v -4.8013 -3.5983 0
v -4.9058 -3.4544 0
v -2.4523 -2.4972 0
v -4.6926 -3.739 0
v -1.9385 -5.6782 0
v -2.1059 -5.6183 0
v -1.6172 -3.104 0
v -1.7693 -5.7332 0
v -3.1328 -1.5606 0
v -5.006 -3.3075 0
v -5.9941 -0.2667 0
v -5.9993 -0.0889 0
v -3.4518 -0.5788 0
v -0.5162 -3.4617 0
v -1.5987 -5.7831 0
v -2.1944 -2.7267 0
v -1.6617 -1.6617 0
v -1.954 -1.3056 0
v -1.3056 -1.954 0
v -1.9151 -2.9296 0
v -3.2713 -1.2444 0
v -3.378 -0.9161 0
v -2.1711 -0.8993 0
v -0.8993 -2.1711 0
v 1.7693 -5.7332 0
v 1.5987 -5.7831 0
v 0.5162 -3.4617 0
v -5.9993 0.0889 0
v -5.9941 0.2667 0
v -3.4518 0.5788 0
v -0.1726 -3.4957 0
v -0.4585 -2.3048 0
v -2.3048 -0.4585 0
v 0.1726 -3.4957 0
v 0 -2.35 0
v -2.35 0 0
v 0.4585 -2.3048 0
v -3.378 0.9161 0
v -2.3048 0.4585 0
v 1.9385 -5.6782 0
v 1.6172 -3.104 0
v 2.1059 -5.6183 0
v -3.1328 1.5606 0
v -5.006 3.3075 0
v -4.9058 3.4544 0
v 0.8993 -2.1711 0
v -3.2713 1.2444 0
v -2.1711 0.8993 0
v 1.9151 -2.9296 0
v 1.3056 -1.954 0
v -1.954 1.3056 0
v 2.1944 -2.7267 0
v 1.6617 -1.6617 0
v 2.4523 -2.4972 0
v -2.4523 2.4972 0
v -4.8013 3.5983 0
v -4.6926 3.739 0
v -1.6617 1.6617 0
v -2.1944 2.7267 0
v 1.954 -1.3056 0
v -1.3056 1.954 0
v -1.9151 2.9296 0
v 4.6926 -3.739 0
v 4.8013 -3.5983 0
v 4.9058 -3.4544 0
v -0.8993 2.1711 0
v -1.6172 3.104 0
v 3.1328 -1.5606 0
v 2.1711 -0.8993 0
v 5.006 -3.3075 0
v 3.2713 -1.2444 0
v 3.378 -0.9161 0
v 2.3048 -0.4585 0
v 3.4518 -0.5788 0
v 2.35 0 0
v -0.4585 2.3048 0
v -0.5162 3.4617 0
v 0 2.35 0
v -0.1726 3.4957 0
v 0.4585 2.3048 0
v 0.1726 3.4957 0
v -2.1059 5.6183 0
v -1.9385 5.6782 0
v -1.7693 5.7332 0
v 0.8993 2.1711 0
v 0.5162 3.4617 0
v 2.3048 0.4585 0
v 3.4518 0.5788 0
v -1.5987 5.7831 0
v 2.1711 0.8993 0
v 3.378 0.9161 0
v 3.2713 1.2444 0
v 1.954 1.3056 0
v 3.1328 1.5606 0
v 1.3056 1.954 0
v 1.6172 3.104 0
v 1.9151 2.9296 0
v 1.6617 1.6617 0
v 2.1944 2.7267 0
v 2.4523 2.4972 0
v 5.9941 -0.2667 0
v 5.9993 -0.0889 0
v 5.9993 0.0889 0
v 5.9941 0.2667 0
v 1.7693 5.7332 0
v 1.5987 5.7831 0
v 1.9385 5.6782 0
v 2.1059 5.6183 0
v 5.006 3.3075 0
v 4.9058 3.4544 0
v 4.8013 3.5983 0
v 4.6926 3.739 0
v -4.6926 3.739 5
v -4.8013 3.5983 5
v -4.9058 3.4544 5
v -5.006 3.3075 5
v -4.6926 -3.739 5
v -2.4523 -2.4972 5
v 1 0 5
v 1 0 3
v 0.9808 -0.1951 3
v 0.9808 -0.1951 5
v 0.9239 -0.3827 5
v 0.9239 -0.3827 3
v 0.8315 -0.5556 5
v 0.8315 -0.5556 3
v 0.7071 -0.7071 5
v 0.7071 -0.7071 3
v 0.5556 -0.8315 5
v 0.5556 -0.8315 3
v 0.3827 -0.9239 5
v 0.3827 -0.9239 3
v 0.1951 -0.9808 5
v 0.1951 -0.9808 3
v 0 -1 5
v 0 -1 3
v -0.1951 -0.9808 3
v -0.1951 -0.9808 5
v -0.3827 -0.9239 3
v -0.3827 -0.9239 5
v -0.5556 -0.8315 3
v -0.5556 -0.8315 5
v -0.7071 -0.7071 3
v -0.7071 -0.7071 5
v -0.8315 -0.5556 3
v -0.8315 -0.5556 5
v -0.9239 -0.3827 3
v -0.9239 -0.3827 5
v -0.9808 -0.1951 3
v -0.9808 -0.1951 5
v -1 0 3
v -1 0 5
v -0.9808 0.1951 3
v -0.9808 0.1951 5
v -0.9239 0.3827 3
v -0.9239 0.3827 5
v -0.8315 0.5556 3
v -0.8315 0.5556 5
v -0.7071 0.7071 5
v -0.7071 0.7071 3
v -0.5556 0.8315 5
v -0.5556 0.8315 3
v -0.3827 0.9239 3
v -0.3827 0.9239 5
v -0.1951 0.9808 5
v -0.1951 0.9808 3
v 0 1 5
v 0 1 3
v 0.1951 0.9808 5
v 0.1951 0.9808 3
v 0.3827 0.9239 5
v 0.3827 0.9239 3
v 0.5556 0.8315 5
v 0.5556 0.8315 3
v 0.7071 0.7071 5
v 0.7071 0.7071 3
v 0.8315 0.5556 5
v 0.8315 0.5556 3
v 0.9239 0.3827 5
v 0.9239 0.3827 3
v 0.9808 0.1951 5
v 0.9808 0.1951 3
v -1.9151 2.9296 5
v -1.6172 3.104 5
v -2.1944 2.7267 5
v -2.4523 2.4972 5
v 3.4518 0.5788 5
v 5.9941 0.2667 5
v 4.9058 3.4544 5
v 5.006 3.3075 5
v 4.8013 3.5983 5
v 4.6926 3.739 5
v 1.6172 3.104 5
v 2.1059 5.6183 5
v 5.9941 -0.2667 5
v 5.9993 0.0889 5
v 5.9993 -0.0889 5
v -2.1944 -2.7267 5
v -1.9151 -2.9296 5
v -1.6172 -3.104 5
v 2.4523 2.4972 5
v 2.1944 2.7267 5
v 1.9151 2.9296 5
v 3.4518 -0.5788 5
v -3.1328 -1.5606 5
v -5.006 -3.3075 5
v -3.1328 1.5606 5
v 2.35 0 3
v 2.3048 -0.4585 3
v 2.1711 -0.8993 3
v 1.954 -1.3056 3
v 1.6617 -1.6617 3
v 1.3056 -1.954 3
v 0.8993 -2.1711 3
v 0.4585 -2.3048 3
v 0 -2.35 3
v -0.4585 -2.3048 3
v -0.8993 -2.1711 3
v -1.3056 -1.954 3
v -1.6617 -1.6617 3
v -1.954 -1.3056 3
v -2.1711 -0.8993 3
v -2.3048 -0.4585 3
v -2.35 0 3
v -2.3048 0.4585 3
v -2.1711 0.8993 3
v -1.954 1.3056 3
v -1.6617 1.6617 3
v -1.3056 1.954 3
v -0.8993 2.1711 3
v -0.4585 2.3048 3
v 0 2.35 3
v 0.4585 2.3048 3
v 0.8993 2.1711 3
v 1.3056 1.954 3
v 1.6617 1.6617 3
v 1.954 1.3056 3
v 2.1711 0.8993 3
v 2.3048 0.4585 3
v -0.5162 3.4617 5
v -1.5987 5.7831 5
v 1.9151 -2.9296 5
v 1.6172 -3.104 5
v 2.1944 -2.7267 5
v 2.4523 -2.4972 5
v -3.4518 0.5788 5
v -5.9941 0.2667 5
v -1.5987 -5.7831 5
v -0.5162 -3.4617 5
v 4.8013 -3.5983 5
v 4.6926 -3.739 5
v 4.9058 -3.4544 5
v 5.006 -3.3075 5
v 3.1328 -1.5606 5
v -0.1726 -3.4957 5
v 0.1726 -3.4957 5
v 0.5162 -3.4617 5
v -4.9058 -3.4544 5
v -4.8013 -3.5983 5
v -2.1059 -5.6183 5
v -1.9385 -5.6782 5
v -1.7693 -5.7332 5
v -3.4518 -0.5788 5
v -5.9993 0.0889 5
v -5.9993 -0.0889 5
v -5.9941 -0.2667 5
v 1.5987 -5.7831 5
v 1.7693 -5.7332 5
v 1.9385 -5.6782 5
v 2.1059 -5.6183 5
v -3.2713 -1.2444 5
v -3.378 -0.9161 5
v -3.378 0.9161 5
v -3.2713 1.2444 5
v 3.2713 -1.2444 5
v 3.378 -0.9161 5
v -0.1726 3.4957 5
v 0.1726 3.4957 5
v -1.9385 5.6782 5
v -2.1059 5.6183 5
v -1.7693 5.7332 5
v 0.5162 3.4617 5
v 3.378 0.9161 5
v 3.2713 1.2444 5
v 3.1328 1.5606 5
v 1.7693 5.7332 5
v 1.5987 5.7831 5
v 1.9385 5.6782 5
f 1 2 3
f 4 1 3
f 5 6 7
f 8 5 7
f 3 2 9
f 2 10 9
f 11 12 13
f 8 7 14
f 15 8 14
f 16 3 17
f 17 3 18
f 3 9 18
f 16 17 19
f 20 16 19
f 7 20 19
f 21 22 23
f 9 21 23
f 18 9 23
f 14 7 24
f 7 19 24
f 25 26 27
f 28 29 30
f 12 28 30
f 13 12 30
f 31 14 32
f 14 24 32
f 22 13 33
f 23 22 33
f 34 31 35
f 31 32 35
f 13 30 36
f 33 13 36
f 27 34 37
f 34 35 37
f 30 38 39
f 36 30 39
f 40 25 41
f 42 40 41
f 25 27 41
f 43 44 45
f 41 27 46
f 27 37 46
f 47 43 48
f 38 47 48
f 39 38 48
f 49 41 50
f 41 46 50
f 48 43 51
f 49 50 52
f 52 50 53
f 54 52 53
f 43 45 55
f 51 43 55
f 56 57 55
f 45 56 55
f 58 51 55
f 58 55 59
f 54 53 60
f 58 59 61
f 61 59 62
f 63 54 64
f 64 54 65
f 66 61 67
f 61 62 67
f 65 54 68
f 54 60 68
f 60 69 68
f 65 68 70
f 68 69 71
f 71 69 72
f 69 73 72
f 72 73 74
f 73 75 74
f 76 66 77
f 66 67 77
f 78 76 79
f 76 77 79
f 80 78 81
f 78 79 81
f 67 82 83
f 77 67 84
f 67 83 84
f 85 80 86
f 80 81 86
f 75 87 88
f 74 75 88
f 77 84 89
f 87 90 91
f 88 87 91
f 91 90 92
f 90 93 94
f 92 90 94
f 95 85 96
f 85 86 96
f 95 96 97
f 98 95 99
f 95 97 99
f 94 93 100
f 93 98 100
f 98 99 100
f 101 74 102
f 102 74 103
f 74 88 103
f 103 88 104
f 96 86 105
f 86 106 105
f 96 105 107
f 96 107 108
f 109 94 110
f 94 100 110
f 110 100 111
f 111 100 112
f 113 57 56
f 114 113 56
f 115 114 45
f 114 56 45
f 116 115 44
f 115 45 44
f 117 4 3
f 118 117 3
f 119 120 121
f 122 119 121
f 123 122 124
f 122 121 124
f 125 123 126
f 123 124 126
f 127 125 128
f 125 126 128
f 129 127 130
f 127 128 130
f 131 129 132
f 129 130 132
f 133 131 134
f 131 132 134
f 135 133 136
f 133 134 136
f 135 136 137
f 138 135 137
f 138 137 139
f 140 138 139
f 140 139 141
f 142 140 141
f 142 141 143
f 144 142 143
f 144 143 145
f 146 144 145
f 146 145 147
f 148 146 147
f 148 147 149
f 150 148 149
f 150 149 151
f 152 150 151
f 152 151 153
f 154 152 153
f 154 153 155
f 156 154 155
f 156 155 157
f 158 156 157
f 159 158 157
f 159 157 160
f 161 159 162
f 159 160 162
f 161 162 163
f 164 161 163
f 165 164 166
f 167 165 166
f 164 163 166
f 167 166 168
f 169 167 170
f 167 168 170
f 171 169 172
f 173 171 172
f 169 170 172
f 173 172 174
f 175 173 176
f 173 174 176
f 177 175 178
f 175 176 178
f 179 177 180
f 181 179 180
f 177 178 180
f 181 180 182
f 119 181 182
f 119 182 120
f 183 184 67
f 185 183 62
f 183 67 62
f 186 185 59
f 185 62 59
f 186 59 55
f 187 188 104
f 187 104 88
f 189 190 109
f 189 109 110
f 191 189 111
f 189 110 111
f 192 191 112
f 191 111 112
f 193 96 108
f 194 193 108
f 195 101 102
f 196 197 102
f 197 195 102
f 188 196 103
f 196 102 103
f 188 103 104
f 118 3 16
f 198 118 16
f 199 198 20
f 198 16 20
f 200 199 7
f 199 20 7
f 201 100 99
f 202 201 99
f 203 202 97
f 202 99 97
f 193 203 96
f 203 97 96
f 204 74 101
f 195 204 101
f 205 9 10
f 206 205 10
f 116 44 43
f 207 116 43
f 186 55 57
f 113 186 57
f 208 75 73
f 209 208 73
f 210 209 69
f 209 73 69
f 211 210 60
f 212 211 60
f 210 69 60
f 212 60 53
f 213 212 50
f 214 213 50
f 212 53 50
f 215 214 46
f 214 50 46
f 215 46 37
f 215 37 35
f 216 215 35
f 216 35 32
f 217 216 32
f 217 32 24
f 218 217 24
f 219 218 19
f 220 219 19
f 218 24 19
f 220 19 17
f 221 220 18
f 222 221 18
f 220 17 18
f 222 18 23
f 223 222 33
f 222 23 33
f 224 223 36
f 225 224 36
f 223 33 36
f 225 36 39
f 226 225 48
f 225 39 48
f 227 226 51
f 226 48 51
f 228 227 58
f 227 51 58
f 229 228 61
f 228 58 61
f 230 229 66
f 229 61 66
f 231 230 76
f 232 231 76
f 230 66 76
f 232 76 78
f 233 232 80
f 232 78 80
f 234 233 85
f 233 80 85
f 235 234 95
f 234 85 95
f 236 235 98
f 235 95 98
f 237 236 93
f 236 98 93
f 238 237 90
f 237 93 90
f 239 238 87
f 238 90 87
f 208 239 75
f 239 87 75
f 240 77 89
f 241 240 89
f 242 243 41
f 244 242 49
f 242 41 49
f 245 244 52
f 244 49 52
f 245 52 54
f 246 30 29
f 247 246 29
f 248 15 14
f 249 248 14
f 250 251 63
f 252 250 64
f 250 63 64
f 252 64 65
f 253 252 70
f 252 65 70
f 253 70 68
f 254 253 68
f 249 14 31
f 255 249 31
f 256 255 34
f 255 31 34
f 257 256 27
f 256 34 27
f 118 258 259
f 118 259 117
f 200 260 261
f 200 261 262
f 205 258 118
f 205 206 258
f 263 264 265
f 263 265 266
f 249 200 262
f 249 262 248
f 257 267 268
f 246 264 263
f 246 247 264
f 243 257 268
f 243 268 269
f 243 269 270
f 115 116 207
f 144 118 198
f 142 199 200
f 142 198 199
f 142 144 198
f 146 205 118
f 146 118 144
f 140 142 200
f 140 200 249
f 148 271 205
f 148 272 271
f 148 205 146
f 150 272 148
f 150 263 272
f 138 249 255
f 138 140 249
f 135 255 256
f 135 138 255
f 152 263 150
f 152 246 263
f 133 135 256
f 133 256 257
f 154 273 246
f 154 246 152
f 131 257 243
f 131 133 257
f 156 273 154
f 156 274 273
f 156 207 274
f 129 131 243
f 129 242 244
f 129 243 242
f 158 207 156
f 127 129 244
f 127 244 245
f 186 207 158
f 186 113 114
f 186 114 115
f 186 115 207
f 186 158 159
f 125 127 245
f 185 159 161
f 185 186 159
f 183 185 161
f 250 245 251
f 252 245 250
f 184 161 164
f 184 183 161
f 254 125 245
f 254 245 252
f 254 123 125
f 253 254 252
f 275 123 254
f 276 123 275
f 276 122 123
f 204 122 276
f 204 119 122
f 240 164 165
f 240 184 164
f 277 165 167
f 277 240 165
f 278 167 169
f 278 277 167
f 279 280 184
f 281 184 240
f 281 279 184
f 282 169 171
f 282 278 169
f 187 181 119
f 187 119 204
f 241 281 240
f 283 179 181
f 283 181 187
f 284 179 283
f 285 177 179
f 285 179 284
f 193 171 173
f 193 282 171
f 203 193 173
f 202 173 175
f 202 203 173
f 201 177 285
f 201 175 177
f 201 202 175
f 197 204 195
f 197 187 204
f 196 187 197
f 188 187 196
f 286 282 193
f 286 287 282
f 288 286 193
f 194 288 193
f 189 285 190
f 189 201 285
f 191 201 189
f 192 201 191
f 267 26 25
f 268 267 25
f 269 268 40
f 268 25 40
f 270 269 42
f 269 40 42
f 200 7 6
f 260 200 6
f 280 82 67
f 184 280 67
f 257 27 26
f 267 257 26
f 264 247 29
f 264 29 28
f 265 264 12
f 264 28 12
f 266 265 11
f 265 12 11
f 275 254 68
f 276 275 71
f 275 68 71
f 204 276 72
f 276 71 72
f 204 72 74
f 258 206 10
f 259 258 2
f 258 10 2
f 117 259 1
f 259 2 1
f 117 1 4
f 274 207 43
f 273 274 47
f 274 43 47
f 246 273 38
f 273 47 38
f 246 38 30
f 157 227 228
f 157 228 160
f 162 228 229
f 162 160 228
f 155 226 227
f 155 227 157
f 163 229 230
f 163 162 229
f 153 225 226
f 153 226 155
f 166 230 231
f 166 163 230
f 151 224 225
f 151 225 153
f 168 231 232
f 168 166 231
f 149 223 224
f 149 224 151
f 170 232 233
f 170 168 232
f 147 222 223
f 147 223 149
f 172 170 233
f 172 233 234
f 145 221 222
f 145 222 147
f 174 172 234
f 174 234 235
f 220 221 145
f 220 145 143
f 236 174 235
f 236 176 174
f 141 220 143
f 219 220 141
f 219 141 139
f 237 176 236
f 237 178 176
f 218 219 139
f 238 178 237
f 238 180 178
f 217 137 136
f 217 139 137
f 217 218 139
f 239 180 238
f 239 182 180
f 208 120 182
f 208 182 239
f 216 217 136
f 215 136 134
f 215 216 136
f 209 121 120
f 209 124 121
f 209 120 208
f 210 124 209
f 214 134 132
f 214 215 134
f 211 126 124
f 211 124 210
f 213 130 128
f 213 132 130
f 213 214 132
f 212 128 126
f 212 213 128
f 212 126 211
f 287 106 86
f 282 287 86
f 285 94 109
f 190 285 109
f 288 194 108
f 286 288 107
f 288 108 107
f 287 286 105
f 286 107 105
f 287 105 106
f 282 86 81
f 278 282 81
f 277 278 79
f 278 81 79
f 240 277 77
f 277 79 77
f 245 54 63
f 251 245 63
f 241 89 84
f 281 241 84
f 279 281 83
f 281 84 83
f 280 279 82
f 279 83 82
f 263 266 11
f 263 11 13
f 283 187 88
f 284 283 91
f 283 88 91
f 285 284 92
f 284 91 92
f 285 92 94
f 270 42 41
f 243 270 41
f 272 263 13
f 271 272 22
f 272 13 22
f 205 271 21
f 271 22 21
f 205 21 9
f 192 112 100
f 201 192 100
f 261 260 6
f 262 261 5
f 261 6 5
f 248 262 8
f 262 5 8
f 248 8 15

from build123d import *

# Parameters (mm, degrees)
F0_R     = 6
F0_R_2   = 2.5
F1_DEPTH = 5
F3_DEPTH = 25
F4_R     = 2.35
F5_DEPTH = 3
F6_R     = 1
F7_DEPTH = 25


with BuildPart() as f1:
    # F0 (on Top) → F1 (new body)
    with BuildSketch(Plane.XY):
        Circle(F0_R)
        Circle(F0_R_2, mode=Mode.SUBTRACT)
        Circle(F0_R_2)
    extrude(amount=F1_DEPTH)

    # F2 (on face) → F3 (cut)
    with BuildSketch(Plane(origin=(0, 0, 0), x_dir=(1, 0, 0), z_dir=(0, 0, -1))):
        with BuildLine():
            ThreePointArc((-0.5161768662, 3.4617281006), (0, 3.5), (0.5161768662, 3.4617281006))
            Line((0.5161768662, 3.4617281006), (1.5986529108, 5.7831054695))
            ThreePointArc((1.5986529108, 5.7831054695), (0, 6), (-1.5986529108, 5.7831054695))
            Line((-1.5986529108, 5.7831054695), (-0.5161768662, 3.4617281006))
        make_face()
        with BuildLine():
            ThreePointArc((-2.4523485819, 2.4971957138), (-2.057248383, 2.8315594803), (-1.6171568681, 3.1039980129))
            Line((-1.6171568681, 3.1039980129), (-2.1058867345, 5.6182952095))
            ThreePointArc((-2.1058867345, 5.6182952095), (-3.5267115138, 4.8541019662), (-4.6925614803, 3.7389660006))
            Line((-4.6925614803, 3.7389660006), (-2.4523485819, 2.4971957138))
        make_face()
        with BuildLine():
            ThreePointArc((-3.4518064915, 0.5788194408), (-3.328697807, 1.0815594803), (-3.132791644, 1.5606461852))
            Line((-3.132791644, 1.5606461852), (-5.0060492236, 3.3074871384))
            ThreePointArc((-5.0060492236, 3.3074871384), (-5.7063390978, 1.8541019662), (-5.9940710587, 0.2666686023))
            Line((-5.9940710587, 0.2666686023), (-3.4518064915, 0.5788194408))
        make_face()
        with BuildLine():
            Line((-5.0060492236, -3.3074871384), (-3.132791644, -1.5606461852))
            ThreePointArc((-3.132791644, -1.5606461852), (-3.328697807, -1.0815594803), (-3.4518064915, -0.5788194408))
            Line((-3.4518064915, -0.5788194408), (-5.9940710587, -0.2666686023))
            ThreePointArc((-5.9940710587, -0.2666686023), (-5.7063390978, -1.8541019662), (-5.0060492236, -3.3074871384))
        make_face()
        with BuildLine():
            Line((-2.1058867345, -5.6182952095), (-1.6171568681, -3.1039980129))
            ThreePointArc((-1.6171568681, -3.1039980129), (-2.057248383, -2.8315594803), (-2.4523485819, -2.4971957138))
            Line((-2.4523485819, -2.4971957138), (-4.6925614803, -3.7389660006))
            ThreePointArc((-4.6925614803, -3.7389660006), (-3.5267115138, -4.8541019662), (-2.1058867345, -5.6182952095))
        make_face()
        with BuildLine():
            Line((1.5986529108, -5.7831054695), (0.5161768662, -3.4617281006))
            ThreePointArc((0.5161768662, -3.4617281006), (0, -3.5), (-0.5161768662, -3.4617281006))
            Line((-0.5161768662, -3.4617281006), (-1.5986529108, -5.7831054695))
            ThreePointArc((-1.5986529108, -5.7831054695), (0, -6), (1.5986529108, -5.7831054695))
        make_face()
        with BuildLine():
            Line((4.6925614803, -3.7389660006), (2.4523485819, -2.4971957138))
            ThreePointArc((2.4523485819, -2.4971957138), (2.057248383, -2.8315594803), (1.6171568681, -3.1039980129))
            Line((1.6171568681, -3.1039980129), (2.1058867345, -5.6182952095))
            ThreePointArc((2.1058867345, -5.6182952095), (3.5267115138, -4.8541019662), (4.6925614803, -3.7389660006))
        make_face()
        with BuildLine():
            Line((5.9940710587, -0.2666686023), (3.4518064915, -0.5788194408))
            ThreePointArc((3.4518064915, -0.5788194408), (3.328697807, -1.0815594803), (3.132791644, -1.5606461852))
            Line((3.132791644, -1.5606461852), (5.0060492236, -3.3074871384))
            ThreePointArc((5.0060492236, -3.3074871384), (5.7063390978, -1.8541019662), (5.9940710587, -0.2666686023))
        make_face()
        with BuildLine():
            ThreePointArc((3.132791644, 1.5606461852), (3.328697807, 1.0815594803), (3.4518064915, 0.5788194408))
            Line((3.4518064915, 0.5788194408), (5.9940710587, 0.2666686023))
            ThreePointArc((5.9940710587, 0.2666686023), (5.7063390978, 1.8541019662), (5.0060492236, 3.3074871384))
            Line((5.0060492236, 3.3074871384), (3.132791644, 1.5606461852))
        make_face()
        with BuildLine():
            ThreePointArc((1.6171568681, 3.1039980129), (2.057248383, 2.8315594803), (2.4523485819, 2.4971957138))
            Line((2.4523485819, 2.4971957138), (4.6925614803, 3.7389660006))
            ThreePointArc((4.6925614803, 3.7389660006), (3.5267115138, 4.8541019662), (2.1058867345, 5.6182952095))
            Line((2.1058867345, 5.6182952095), (1.6171568681, 3.1039980129))
        make_face()
    extrude(amount=-F3_DEPTH, mode=Mode.SUBTRACT)

    # F4 (on face) → F5 (cut)
    with BuildSketch(Plane(origin=(0, 0, 0), x_dir=(1, 0, 0), z_dir=(0, 0, -1))):
        Circle(F4_R)
    extrude(amount=-F5_DEPTH, mode=Mode.SUBTRACT)

    # F6 (on face) → F7 (cut)
    with BuildSketch(Plane(origin=(0, 0, 0), x_dir=(1, 0, 0), z_dir=(0, 0, -1))):
        Circle(F6_R)
    extrude(amount=-F7_DEPTH, mode=Mode.SUBTRACT)


solid = f1.part
